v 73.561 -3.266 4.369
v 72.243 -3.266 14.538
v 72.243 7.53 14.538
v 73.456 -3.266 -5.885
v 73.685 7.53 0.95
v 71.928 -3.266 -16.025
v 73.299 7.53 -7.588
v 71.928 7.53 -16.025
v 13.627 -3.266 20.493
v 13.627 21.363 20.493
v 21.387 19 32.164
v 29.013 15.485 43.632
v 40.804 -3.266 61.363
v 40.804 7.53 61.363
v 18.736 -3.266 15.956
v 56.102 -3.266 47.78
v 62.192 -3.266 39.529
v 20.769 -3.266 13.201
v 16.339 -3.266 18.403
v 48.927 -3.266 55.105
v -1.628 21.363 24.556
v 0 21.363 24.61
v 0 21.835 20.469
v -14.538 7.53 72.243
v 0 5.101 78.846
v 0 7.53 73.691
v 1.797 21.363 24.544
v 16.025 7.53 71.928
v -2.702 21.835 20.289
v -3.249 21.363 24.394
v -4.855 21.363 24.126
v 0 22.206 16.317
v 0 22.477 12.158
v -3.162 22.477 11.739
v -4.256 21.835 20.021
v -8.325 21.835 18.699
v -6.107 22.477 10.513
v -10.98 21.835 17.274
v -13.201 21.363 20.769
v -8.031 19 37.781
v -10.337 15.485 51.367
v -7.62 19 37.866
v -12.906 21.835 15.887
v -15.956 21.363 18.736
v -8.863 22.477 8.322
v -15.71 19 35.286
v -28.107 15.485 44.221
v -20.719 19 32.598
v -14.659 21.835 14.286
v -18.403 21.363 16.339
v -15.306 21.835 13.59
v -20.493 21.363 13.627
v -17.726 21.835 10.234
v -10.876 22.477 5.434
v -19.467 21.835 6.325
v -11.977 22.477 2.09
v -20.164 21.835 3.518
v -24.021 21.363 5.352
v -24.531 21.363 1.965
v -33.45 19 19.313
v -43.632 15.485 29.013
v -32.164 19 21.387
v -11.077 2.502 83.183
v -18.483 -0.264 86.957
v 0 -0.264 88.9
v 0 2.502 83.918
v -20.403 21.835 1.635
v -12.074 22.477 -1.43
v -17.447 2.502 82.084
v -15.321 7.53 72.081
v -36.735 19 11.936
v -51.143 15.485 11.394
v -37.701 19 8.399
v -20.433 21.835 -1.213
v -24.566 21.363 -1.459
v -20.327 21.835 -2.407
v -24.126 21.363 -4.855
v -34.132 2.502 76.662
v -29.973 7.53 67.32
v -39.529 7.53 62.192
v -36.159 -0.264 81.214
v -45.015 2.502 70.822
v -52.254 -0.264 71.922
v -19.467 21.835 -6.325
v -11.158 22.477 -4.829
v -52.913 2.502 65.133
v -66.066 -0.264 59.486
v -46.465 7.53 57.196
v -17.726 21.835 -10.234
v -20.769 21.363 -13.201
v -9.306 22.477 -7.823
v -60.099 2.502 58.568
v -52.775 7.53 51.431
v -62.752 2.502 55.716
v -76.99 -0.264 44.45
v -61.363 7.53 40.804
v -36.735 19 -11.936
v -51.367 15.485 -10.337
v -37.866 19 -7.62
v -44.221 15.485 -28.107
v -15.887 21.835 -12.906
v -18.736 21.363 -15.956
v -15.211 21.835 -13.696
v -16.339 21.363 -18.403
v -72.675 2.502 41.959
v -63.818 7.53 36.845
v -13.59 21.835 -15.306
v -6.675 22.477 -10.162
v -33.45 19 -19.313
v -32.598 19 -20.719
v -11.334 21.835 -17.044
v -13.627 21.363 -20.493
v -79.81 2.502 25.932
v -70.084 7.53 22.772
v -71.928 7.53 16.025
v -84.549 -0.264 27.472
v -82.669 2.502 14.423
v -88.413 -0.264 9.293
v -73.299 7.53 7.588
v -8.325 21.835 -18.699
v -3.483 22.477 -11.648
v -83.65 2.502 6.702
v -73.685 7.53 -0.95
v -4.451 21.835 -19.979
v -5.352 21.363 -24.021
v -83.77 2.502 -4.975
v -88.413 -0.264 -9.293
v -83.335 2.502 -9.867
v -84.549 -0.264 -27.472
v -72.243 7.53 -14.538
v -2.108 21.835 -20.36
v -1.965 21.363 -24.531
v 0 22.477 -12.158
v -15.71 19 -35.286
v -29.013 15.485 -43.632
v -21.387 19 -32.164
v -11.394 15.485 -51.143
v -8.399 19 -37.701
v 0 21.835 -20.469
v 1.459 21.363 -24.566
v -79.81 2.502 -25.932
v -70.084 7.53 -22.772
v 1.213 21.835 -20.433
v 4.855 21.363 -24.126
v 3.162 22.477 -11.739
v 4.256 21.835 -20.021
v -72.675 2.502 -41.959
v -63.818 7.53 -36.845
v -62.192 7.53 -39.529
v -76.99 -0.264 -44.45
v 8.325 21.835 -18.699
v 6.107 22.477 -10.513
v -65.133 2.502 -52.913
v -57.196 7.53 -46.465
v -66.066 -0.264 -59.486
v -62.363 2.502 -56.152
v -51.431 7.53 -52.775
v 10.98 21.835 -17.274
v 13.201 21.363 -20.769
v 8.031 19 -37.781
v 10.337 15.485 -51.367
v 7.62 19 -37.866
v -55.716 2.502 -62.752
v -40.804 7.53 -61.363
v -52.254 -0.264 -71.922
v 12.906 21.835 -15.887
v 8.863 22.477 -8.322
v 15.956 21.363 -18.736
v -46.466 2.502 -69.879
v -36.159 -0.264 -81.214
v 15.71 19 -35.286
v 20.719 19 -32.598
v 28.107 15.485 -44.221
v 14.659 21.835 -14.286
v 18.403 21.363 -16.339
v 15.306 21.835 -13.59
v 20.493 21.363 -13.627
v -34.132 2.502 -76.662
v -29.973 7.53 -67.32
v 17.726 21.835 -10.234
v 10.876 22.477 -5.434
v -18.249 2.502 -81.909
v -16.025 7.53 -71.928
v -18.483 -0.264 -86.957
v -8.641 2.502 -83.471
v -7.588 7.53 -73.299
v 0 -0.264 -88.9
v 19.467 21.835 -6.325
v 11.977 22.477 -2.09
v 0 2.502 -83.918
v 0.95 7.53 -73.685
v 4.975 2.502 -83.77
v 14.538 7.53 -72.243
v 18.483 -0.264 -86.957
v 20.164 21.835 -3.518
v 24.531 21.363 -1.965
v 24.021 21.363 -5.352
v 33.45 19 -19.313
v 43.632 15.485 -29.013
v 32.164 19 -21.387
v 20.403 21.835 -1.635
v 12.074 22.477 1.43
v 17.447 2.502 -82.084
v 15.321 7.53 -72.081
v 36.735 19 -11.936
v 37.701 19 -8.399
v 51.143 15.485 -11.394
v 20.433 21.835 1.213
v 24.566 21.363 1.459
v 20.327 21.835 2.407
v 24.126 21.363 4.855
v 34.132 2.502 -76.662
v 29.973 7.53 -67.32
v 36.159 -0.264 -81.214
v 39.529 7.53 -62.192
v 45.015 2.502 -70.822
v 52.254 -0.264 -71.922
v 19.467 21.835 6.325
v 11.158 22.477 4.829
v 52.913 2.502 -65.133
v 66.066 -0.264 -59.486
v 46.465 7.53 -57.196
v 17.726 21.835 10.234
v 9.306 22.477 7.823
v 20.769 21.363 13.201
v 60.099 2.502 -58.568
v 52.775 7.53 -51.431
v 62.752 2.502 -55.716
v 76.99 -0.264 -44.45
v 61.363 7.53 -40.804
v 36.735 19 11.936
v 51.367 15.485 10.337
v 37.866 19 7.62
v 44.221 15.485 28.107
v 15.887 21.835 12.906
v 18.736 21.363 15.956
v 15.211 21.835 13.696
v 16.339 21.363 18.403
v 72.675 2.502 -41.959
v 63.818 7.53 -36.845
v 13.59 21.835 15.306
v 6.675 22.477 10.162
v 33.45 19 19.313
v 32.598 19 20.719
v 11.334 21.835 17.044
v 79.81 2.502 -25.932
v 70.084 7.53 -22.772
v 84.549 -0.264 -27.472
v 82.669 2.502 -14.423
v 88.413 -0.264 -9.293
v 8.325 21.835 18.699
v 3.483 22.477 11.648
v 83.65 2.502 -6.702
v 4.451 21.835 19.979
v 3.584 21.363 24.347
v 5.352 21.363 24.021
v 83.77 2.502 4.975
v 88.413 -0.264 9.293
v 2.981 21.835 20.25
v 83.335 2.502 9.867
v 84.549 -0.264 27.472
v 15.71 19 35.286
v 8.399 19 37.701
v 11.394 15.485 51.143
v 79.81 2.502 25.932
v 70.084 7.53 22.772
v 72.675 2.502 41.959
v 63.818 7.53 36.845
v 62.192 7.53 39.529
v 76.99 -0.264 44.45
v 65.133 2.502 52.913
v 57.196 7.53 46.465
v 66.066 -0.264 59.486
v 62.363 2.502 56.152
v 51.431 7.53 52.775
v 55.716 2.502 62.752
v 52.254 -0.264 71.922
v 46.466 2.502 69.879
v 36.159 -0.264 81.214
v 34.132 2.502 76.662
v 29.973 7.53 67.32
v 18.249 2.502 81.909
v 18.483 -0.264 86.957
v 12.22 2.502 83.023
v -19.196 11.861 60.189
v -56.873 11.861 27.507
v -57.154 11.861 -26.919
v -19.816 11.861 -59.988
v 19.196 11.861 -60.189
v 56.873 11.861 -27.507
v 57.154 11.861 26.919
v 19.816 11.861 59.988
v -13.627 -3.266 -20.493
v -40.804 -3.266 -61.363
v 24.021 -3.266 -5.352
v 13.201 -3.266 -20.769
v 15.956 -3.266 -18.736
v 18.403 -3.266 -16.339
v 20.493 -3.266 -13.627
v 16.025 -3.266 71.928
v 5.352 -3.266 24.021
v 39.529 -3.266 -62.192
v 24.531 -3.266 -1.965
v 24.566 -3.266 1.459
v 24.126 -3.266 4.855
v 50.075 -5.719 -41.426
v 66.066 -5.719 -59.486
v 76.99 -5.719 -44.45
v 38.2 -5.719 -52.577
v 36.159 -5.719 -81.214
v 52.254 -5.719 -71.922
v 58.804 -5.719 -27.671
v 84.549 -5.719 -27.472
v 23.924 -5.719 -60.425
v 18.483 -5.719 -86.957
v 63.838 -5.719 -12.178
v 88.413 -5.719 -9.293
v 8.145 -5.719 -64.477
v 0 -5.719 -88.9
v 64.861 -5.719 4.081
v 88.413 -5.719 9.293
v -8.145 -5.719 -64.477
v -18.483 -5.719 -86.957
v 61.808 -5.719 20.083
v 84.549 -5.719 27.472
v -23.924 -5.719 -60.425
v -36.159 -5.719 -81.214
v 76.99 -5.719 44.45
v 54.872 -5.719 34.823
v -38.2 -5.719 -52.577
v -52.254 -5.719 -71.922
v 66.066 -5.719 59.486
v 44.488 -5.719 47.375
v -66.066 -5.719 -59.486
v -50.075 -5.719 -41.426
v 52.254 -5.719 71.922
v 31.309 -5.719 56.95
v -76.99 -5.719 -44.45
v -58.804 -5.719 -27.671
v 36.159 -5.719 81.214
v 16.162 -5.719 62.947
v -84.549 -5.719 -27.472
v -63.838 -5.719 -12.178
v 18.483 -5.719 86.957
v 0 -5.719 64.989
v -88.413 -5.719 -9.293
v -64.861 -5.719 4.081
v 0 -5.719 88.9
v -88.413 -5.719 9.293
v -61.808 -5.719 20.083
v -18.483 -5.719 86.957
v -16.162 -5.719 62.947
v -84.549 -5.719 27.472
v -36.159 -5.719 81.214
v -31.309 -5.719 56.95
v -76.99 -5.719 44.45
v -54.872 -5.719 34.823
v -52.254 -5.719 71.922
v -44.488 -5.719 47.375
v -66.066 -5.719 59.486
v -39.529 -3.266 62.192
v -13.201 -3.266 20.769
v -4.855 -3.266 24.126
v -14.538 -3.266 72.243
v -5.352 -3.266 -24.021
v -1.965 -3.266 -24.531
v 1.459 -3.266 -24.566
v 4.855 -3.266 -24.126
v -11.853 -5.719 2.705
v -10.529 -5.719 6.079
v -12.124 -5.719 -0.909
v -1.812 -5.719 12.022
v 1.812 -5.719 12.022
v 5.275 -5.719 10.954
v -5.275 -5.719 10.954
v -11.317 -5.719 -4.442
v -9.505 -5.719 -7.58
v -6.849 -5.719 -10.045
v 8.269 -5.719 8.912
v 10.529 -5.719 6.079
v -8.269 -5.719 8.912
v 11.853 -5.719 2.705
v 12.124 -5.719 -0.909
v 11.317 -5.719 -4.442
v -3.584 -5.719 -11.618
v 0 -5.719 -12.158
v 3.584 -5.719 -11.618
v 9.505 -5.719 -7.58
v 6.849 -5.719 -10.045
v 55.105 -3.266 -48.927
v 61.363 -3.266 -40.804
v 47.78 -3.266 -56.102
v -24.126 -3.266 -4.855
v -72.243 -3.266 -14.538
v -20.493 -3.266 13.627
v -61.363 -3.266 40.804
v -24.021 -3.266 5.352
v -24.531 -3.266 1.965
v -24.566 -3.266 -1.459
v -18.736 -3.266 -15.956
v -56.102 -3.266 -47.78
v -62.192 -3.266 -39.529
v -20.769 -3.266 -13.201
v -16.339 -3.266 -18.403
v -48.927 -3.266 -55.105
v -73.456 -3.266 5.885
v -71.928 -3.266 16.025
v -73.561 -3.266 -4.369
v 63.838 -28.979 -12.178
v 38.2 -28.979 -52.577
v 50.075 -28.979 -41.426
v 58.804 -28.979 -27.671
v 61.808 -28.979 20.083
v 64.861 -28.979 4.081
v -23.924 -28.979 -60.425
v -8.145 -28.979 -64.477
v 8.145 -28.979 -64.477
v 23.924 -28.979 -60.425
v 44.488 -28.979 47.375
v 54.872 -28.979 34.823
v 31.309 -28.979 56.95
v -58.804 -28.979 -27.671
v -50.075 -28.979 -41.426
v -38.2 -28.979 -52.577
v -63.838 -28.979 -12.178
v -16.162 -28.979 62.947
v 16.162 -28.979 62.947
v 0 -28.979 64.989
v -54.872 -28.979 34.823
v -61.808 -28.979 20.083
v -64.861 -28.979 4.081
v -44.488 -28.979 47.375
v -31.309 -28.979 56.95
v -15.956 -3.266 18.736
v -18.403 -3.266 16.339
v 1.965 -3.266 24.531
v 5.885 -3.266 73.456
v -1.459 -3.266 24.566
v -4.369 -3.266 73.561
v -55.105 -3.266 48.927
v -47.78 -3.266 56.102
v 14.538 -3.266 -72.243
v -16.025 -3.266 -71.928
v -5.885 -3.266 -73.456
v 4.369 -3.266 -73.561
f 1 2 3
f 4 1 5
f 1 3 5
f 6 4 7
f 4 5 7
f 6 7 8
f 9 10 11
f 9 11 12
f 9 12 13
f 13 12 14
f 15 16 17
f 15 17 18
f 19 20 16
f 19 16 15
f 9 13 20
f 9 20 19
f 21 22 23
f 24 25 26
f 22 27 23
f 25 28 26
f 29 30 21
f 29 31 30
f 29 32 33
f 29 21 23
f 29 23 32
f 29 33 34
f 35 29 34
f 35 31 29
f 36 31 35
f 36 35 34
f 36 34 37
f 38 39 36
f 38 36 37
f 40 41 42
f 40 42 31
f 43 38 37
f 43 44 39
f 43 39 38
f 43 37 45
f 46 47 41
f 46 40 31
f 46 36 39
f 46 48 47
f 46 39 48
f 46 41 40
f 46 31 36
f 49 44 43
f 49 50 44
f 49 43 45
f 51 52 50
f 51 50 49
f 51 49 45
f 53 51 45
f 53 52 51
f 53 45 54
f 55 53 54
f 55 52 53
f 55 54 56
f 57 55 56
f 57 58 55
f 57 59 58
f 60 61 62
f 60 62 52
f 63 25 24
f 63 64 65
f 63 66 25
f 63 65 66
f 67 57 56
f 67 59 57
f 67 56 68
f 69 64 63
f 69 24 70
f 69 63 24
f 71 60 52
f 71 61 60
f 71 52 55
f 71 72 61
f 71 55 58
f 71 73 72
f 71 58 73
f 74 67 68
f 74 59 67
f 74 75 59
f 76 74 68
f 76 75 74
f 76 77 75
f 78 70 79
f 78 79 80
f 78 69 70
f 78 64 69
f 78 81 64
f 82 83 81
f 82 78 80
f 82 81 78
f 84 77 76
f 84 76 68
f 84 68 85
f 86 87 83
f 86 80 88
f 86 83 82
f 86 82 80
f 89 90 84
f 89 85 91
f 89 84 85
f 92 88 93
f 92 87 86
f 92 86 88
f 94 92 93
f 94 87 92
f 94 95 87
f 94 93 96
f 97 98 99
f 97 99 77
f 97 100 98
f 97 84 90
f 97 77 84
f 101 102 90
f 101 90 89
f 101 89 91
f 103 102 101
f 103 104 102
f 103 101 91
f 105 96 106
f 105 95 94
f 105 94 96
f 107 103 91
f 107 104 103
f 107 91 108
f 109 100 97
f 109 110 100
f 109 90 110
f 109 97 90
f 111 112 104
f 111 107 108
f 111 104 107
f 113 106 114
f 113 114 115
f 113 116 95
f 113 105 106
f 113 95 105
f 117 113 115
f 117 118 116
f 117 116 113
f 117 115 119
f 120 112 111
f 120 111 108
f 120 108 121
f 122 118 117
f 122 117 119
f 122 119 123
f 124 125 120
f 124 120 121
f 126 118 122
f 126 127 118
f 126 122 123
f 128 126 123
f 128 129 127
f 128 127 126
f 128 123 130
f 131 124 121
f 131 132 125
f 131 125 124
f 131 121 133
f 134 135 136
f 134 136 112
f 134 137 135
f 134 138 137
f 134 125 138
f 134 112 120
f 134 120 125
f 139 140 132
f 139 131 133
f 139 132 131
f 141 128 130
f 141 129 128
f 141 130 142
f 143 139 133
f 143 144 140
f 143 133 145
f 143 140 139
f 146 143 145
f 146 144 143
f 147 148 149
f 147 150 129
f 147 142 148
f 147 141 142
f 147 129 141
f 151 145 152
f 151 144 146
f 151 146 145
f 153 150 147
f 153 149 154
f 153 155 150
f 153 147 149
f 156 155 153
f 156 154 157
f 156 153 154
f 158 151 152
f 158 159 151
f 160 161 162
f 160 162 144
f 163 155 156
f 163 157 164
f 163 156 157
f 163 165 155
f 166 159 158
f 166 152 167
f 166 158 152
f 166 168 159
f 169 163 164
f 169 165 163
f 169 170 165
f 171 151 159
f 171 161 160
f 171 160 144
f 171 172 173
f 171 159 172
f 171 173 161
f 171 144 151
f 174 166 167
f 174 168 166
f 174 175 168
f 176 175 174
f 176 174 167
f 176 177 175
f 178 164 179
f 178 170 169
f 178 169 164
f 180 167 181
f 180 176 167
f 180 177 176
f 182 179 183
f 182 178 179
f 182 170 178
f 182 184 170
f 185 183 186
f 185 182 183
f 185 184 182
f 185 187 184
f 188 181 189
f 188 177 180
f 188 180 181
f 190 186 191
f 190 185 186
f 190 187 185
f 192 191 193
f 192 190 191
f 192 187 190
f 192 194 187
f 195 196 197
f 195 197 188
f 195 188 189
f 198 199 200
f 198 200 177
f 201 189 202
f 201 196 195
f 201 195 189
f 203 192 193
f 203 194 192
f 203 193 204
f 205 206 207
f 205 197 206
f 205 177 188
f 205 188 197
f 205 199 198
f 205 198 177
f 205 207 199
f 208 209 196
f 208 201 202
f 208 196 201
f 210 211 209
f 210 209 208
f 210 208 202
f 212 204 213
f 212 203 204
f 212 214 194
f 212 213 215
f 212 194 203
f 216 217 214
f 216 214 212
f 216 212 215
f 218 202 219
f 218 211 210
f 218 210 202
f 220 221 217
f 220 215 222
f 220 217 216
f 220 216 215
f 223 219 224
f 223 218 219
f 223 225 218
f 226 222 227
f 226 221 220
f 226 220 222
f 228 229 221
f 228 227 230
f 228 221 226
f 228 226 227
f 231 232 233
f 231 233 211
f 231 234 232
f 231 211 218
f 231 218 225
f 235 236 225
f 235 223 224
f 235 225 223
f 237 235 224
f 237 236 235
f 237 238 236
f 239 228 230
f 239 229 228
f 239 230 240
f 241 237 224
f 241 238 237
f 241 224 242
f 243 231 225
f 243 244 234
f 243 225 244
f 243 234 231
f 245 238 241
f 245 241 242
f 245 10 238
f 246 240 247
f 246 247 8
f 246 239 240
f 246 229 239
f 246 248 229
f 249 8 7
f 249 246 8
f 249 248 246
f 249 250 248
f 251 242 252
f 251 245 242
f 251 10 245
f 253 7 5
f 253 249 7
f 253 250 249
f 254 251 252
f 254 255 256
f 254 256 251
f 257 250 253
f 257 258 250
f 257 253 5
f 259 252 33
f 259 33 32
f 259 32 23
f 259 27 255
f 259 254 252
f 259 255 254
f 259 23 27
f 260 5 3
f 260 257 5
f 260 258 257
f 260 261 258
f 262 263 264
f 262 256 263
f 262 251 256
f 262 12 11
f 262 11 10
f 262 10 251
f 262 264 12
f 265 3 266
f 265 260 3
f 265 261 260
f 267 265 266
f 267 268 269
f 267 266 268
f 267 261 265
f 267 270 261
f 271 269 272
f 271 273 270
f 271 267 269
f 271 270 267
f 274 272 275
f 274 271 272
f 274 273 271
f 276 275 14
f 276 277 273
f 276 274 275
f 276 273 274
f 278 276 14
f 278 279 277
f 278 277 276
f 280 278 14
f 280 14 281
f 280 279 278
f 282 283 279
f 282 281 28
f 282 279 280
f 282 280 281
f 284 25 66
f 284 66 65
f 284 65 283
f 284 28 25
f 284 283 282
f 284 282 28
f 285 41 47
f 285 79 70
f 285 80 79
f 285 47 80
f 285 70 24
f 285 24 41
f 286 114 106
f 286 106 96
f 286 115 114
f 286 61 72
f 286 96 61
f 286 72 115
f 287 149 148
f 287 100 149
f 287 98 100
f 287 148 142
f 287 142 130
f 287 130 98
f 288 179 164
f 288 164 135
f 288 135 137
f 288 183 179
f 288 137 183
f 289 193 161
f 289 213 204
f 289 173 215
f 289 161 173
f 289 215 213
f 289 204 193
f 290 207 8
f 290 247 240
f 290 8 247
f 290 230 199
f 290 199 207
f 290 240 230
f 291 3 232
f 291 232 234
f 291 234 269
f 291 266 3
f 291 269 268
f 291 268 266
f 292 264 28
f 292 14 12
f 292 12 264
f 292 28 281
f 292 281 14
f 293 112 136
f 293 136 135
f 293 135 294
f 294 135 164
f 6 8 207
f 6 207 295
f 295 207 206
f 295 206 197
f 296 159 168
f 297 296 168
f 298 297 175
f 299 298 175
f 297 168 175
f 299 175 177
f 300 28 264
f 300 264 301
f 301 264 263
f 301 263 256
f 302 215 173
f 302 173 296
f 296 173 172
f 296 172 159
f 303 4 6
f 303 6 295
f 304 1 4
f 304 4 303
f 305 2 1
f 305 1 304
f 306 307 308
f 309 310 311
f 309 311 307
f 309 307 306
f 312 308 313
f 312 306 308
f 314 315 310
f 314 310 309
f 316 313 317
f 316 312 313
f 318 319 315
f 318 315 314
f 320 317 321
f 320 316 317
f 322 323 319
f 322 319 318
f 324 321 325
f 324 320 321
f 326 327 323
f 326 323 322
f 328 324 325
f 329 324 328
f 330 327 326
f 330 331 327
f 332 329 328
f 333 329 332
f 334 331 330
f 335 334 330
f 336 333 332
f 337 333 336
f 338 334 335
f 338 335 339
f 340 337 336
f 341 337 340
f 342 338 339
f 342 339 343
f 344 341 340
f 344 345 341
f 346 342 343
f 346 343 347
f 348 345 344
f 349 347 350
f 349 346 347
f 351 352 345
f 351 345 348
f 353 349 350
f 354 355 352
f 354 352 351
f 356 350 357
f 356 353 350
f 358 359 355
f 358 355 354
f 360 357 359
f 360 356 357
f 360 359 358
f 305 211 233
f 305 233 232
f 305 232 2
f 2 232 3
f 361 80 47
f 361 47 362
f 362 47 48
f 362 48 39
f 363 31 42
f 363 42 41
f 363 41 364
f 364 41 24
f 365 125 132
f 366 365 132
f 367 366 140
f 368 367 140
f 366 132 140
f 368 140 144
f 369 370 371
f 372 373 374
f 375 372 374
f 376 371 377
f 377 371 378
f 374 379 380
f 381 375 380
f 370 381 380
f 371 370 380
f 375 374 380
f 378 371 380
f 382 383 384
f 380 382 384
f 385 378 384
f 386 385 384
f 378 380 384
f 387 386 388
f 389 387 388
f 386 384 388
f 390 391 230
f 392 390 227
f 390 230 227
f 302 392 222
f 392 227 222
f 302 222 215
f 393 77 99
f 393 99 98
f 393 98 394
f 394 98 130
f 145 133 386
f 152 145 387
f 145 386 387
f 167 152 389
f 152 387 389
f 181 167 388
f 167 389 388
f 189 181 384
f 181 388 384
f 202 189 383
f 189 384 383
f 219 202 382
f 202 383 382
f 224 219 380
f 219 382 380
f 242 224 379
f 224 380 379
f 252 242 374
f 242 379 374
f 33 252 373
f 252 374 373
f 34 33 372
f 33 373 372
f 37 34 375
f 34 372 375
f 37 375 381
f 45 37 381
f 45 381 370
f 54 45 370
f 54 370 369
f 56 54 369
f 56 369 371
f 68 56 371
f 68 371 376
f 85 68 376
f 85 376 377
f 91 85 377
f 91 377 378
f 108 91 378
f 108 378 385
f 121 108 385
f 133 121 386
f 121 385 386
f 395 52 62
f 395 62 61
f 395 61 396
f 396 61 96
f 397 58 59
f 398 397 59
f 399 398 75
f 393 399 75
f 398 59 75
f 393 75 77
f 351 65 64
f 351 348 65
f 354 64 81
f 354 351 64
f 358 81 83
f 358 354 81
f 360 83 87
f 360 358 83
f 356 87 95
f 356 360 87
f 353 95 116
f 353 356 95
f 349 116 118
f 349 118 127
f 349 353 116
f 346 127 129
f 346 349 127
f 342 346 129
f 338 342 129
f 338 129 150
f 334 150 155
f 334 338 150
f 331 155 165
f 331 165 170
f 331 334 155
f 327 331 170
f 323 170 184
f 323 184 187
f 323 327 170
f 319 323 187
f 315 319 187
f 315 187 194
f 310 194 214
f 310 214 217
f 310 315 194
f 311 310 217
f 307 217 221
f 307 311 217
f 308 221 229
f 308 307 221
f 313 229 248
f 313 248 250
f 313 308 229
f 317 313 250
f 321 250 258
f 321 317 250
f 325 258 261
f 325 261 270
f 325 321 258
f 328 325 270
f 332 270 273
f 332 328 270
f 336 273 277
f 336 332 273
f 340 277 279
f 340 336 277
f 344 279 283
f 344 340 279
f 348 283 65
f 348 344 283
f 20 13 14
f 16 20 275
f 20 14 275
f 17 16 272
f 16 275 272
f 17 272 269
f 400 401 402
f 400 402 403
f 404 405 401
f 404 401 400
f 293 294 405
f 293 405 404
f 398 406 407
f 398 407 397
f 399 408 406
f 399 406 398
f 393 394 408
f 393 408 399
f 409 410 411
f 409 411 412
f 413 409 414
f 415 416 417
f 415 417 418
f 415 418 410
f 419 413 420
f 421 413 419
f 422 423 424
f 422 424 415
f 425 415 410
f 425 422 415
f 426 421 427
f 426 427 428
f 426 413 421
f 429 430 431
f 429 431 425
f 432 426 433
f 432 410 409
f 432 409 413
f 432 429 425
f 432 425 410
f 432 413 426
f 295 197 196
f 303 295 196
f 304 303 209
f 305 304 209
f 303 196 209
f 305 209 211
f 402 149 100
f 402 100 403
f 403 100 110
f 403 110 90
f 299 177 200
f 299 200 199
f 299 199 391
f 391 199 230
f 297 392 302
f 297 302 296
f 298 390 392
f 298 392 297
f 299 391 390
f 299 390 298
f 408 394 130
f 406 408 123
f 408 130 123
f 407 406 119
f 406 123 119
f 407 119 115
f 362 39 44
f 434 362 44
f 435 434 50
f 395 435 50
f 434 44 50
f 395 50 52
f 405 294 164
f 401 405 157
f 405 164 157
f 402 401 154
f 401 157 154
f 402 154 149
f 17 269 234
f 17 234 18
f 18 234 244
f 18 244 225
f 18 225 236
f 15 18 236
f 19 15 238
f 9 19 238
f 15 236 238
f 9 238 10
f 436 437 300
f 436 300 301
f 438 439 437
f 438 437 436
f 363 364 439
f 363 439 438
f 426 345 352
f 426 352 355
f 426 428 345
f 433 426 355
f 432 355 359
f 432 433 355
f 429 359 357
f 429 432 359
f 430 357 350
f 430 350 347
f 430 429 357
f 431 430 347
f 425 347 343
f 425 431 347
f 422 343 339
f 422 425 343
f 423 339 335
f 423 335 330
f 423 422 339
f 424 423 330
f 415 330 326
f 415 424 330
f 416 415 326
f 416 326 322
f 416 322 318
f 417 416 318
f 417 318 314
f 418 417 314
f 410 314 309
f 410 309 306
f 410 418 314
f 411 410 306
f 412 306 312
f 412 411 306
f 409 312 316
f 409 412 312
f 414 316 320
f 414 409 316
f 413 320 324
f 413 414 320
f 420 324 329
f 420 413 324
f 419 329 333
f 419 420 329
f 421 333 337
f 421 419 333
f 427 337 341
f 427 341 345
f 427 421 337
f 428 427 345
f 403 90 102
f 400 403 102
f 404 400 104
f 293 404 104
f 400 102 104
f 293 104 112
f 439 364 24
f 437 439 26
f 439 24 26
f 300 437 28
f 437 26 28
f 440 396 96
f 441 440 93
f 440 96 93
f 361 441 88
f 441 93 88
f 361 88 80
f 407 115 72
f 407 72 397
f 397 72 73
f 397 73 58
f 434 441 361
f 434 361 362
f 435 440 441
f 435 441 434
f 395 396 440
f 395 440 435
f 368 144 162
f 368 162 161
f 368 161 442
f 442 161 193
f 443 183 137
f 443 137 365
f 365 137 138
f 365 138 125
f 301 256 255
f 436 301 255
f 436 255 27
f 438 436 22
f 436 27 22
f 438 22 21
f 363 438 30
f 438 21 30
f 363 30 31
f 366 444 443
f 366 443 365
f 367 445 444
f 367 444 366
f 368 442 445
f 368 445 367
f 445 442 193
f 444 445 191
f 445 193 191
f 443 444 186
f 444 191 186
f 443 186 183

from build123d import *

# Parameters (mm, degrees)
CUT_EXTRUDE3_START = -28.048647
CUT_EXTRUDE3_DEPTH = 25.508647
CIRPATTERN2_COUNT  = 8
CUT_EXTRUDE4_REACH = 31.45
SKETCH6_R          = 12.59210321
SCALE1_SCALE       = 0.96551724


with BuildPart() as part:
    # Sketch1 → Revolve1 (revolve)
    with BuildSketch(Plane.XY, mode=Mode.PRIVATE) as revolve1_sk:
        with BuildLine():
            Line((-92.075, 0), (-92.075, -5.649667396))
            Line((-92.075, -5.649667396), (-67.31, -5.649667396))
            Line((-67.31, -5.649667396), (-67.31, -29.740701954))
            Line((-67.31, -29.740701954), (0, -29.740701954))
            Line((0, -29.740701954), (0, 0))
            Line((0, 0), (0, 23.771242064))
            ThreePointArc((0, 23.771242064), (-47.656193975, 18.155434253), (-92.075, 0))
        make_face()
    revolve(revolve1_sk.sketch.rotate(Axis((0, 46.369911649, 0), (0, -1, 0)), 270), axis=Axis((0, 46.369911649, 0), (0, -1, 0)))  # turned: the seam where the file's is

    # Sketch4 → Cut-Extrude3 (cut)
    with BuildSketch(Plane.XZ.offset(5.649667396).offset(CUT_EXTRUDE3_START)):
        with BuildLine():
            Line((24.987766053, 5.028443659), (74.822826668, 15.057063026))
            ThreePointArc((74.822826668, 15.057063026), (76.318746359, -0.787077909), (74.496377234, -16.596997215))
            Line((74.496377234, -16.596997215), (24.878745284, -5.542718741))
            ThreePointArc((24.878745284, -5.542718741), (25.487342091, -0.262851853), (24.987766053, 5.028443659))
        make_face()
    cut_extrude3 = extrude(amount=CUT_EXTRUDE3_DEPTH, mode=Mode.SUBTRACT)

    # CirPattern2: Cut-Extrude3 ×8 about axis
    cirpattern2_axis = Axis((0, 0, 0), (0, 1, 0))
    for i in range(1, CIRPATTERN2_COUNT):
        add(cut_extrude3.rotate(cirpattern2_axis, i * 360 / CIRPATTERN2_COUNT), mode=Mode.SUBTRACT)

    # Sketch6 → Cut-Extrude4 (cut, up to next)
    with BuildSketch(Plane.XZ.offset(5.649667396), mode=Mode.PRIVATE) as cut_extrude4_sk1:
        with Locations(Location((0, 0, 0), (0, 0, 270))):  # turned: the seam where the file's is
            Circle(SKETCH6_R)
    cut_extrude4_tool1 = extrude(cut_extrude4_sk1.sketch, amount=-CUT_EXTRUDE4_REACH, mode=Mode.PRIVATE) & part.part
    add(cut_extrude4_tool1.solids().sort_by_distance((0, -5.649667, 0))[0], mode=Mode.SUBTRACT)


with BuildPart() as part_1:
    # Scale1: scaled about (-5e-09, -7.646574392, 0)
    add(part.part.scale(SCALE1_SCALE).moved(Location((0, -0.26367499, 0))))


solid = part_1.part
